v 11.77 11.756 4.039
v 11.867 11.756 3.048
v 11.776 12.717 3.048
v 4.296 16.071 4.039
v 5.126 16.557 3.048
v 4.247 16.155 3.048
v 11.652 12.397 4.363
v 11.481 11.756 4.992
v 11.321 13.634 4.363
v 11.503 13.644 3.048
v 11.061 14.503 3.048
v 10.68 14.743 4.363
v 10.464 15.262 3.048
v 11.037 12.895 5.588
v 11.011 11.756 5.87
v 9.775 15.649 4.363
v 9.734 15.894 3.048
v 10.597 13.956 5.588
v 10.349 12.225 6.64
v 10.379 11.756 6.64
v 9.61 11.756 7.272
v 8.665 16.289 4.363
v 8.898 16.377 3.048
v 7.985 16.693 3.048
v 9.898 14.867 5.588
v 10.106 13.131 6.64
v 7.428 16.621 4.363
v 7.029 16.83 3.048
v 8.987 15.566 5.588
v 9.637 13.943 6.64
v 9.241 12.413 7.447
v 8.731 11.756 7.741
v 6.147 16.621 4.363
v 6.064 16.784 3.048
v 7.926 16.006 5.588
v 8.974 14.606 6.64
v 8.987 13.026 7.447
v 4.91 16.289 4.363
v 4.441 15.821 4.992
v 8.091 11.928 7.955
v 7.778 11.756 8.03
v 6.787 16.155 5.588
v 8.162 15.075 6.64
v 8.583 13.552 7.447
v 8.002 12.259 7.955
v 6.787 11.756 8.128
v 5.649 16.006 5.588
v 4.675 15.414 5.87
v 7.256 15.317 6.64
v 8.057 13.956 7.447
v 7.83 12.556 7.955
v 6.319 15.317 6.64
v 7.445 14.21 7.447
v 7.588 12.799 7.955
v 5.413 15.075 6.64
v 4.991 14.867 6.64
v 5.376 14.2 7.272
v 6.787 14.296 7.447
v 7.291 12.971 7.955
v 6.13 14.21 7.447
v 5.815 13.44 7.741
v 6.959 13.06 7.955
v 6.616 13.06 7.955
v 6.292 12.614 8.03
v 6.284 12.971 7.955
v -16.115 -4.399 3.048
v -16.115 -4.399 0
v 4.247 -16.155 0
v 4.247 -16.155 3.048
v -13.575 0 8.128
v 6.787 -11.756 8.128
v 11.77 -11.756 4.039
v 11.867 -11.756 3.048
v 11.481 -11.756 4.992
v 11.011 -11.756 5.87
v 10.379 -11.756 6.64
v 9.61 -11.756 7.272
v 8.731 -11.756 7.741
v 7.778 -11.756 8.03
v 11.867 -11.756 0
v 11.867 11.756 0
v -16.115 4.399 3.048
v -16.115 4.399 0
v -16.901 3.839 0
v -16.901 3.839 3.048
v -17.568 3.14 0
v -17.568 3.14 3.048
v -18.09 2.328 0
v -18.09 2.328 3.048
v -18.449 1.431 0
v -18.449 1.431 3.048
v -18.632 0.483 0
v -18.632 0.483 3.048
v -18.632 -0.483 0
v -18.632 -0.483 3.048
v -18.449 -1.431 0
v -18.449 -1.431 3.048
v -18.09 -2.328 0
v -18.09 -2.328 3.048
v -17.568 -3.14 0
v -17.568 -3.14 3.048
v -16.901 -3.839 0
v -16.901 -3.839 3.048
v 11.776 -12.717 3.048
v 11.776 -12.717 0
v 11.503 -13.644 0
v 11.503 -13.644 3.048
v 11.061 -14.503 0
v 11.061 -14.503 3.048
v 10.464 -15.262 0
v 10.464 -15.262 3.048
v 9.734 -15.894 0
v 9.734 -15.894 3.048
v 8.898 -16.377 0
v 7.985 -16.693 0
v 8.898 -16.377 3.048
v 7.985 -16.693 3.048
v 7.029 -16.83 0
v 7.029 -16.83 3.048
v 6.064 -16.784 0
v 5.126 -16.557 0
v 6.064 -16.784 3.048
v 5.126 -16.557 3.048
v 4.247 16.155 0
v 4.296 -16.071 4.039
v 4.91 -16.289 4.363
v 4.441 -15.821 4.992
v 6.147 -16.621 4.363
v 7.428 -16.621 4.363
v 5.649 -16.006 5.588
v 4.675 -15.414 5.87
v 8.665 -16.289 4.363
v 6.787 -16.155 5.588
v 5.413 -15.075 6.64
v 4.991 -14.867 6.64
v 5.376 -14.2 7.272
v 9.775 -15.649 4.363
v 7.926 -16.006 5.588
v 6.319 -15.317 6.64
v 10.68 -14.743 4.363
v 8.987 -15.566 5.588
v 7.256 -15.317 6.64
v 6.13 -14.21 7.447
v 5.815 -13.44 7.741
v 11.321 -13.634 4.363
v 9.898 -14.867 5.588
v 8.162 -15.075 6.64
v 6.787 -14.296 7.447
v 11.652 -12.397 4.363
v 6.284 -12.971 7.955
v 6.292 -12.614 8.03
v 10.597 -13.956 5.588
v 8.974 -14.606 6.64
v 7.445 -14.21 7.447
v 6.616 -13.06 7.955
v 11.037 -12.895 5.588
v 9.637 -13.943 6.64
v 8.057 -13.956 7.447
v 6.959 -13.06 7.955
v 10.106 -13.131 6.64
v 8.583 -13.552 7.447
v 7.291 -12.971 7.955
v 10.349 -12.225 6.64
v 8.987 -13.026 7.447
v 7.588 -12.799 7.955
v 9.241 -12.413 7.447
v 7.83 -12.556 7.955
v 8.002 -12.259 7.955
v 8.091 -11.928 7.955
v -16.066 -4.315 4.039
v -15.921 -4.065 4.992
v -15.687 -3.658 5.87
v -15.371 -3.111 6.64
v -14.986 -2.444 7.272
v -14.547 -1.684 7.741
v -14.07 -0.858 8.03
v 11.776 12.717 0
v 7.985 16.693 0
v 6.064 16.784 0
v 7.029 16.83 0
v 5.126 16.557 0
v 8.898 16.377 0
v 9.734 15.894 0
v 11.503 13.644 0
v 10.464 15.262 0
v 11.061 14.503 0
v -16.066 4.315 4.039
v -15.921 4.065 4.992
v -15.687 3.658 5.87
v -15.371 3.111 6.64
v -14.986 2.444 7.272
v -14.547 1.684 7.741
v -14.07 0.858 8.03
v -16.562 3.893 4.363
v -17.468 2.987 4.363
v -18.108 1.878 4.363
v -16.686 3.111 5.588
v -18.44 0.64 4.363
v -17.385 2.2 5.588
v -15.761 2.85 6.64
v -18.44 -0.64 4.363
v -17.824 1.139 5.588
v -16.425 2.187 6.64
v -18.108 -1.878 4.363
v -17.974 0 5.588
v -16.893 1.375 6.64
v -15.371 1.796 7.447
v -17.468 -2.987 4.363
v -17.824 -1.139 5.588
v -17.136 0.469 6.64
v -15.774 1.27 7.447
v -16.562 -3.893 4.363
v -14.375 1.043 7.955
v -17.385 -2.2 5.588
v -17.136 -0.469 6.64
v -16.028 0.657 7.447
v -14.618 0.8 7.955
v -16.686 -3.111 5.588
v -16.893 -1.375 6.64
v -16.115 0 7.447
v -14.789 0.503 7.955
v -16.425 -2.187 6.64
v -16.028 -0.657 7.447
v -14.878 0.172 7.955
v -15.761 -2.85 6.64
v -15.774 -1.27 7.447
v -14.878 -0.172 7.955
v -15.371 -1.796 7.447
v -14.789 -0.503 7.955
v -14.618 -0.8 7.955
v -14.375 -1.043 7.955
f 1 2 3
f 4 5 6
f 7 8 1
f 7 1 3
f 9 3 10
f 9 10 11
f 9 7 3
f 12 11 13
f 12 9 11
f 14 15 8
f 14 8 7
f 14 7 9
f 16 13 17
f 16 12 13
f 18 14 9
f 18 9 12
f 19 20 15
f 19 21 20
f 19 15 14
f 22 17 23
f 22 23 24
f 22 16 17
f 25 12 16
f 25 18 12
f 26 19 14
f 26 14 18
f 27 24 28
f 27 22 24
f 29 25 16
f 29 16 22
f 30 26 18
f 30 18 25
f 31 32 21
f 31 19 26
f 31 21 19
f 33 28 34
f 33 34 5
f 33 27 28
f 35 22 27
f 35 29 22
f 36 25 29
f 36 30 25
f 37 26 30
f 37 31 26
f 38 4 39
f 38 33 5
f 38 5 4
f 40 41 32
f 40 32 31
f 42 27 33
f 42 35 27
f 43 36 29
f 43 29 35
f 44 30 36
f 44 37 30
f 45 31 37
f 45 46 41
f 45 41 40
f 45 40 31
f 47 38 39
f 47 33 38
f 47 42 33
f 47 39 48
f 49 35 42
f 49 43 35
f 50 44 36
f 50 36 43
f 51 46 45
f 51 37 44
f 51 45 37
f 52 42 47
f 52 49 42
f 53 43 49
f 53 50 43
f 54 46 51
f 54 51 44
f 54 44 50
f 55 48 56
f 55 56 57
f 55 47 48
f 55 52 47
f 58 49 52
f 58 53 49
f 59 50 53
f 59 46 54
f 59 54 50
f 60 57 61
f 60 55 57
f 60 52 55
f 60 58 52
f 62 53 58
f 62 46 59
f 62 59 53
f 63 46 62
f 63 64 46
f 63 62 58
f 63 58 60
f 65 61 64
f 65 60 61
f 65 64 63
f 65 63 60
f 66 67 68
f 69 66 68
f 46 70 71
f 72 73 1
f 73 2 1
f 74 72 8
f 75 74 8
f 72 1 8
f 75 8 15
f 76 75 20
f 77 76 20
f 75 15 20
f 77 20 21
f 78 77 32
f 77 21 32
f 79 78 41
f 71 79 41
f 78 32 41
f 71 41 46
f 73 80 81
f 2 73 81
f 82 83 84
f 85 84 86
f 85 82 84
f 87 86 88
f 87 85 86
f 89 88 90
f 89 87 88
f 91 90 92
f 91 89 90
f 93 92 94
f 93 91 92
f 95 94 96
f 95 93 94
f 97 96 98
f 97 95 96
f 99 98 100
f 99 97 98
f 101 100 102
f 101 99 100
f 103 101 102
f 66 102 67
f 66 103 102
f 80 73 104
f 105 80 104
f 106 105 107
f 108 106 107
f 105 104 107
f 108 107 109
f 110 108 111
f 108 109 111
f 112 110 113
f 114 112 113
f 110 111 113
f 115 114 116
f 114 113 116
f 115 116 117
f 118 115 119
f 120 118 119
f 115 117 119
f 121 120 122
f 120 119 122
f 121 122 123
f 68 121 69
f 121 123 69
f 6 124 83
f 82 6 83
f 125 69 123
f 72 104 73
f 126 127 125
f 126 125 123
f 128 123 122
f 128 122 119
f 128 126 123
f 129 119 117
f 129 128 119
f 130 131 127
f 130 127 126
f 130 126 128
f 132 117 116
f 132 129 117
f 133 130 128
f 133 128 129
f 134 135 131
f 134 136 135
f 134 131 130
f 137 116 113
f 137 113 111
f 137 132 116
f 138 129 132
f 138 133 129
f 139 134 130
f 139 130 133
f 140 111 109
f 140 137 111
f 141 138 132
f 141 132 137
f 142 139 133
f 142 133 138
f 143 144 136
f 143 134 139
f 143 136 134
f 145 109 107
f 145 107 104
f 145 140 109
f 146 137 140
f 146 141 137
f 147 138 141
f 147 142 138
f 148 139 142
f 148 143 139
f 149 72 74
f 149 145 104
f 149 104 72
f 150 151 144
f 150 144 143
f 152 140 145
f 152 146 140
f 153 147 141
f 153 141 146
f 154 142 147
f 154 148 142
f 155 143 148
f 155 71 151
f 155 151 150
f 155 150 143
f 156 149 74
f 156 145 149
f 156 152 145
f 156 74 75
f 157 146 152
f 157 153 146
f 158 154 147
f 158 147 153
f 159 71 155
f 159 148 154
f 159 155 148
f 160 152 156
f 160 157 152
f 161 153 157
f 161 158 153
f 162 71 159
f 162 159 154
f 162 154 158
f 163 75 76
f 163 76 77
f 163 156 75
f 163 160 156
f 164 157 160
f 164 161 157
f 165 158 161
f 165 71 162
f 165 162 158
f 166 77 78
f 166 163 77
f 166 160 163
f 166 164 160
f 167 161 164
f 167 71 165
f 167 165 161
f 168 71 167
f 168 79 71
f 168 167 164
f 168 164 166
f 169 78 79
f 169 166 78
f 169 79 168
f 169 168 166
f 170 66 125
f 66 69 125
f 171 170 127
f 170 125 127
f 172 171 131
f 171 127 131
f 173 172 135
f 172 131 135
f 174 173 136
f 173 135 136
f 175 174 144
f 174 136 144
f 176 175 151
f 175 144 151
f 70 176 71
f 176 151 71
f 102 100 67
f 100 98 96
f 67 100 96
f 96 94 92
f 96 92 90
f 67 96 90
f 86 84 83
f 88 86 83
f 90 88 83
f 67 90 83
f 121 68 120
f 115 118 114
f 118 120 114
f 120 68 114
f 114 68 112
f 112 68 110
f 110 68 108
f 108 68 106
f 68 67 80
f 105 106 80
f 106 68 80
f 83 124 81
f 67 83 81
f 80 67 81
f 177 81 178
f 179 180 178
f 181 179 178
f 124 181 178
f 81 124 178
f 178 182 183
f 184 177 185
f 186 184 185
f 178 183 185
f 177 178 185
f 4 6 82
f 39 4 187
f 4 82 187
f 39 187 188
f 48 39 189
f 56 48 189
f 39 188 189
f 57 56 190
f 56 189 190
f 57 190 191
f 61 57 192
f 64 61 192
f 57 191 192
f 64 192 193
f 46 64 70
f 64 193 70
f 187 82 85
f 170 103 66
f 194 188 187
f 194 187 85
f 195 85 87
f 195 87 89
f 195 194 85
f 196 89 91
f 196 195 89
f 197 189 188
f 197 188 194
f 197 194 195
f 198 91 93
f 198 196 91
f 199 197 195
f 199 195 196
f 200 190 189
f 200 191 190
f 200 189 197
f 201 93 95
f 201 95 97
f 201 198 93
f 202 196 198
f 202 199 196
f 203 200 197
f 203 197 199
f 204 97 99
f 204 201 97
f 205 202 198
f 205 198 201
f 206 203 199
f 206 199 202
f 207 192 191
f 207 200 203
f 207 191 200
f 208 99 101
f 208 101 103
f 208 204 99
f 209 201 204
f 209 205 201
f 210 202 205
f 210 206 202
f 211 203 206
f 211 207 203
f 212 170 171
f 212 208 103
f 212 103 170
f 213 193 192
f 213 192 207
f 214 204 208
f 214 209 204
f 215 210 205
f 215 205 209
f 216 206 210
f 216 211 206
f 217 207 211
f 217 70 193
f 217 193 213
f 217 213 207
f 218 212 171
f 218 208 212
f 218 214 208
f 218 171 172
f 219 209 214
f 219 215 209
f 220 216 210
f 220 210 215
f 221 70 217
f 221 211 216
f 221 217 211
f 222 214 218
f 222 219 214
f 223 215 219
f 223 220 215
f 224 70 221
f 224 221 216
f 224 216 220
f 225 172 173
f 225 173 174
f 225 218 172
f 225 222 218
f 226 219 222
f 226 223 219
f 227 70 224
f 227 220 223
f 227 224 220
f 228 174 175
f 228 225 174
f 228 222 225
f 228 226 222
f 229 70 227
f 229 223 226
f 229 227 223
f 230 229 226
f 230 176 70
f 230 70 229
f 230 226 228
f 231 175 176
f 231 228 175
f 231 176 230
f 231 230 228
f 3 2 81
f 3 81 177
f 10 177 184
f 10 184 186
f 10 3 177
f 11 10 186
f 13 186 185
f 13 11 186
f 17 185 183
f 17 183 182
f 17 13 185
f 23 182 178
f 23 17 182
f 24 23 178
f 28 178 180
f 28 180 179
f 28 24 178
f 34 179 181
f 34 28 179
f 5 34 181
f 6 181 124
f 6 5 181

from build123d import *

# Parameters (mm, degrees)
F1_DEPTH = 8.128
F2_R     = 5.08
F3_R     = 5.08


with BuildPart() as f1:
    # F0 (on Top) → F1 (new body)
    with BuildSketch(Plane.XY):
        Polygon((11.867368, -20.554884), (11.867368, 20.554884), (-23.734735, 0), align=None)
    extrude(amount=F1_DEPTH)

    # F2
    f2_edges = [f1.edges().sort_by_distance(p)[0] for p in [
        (11.867368, -20.554884, 4.064),
        (-23.734735, 0, 4.064),
        (11.867368, 20.554884, 4.064),
    ]]
    fillet(f2_edges, radius=F2_R)

    # F3
    f3_edges = [f1.edges().sort_by_distance(p)[0] for p in [
        (11.867368, 0, 8.128),
    ]]
    fillet(f3_edges, radius=F3_R)


solid = f1.part
